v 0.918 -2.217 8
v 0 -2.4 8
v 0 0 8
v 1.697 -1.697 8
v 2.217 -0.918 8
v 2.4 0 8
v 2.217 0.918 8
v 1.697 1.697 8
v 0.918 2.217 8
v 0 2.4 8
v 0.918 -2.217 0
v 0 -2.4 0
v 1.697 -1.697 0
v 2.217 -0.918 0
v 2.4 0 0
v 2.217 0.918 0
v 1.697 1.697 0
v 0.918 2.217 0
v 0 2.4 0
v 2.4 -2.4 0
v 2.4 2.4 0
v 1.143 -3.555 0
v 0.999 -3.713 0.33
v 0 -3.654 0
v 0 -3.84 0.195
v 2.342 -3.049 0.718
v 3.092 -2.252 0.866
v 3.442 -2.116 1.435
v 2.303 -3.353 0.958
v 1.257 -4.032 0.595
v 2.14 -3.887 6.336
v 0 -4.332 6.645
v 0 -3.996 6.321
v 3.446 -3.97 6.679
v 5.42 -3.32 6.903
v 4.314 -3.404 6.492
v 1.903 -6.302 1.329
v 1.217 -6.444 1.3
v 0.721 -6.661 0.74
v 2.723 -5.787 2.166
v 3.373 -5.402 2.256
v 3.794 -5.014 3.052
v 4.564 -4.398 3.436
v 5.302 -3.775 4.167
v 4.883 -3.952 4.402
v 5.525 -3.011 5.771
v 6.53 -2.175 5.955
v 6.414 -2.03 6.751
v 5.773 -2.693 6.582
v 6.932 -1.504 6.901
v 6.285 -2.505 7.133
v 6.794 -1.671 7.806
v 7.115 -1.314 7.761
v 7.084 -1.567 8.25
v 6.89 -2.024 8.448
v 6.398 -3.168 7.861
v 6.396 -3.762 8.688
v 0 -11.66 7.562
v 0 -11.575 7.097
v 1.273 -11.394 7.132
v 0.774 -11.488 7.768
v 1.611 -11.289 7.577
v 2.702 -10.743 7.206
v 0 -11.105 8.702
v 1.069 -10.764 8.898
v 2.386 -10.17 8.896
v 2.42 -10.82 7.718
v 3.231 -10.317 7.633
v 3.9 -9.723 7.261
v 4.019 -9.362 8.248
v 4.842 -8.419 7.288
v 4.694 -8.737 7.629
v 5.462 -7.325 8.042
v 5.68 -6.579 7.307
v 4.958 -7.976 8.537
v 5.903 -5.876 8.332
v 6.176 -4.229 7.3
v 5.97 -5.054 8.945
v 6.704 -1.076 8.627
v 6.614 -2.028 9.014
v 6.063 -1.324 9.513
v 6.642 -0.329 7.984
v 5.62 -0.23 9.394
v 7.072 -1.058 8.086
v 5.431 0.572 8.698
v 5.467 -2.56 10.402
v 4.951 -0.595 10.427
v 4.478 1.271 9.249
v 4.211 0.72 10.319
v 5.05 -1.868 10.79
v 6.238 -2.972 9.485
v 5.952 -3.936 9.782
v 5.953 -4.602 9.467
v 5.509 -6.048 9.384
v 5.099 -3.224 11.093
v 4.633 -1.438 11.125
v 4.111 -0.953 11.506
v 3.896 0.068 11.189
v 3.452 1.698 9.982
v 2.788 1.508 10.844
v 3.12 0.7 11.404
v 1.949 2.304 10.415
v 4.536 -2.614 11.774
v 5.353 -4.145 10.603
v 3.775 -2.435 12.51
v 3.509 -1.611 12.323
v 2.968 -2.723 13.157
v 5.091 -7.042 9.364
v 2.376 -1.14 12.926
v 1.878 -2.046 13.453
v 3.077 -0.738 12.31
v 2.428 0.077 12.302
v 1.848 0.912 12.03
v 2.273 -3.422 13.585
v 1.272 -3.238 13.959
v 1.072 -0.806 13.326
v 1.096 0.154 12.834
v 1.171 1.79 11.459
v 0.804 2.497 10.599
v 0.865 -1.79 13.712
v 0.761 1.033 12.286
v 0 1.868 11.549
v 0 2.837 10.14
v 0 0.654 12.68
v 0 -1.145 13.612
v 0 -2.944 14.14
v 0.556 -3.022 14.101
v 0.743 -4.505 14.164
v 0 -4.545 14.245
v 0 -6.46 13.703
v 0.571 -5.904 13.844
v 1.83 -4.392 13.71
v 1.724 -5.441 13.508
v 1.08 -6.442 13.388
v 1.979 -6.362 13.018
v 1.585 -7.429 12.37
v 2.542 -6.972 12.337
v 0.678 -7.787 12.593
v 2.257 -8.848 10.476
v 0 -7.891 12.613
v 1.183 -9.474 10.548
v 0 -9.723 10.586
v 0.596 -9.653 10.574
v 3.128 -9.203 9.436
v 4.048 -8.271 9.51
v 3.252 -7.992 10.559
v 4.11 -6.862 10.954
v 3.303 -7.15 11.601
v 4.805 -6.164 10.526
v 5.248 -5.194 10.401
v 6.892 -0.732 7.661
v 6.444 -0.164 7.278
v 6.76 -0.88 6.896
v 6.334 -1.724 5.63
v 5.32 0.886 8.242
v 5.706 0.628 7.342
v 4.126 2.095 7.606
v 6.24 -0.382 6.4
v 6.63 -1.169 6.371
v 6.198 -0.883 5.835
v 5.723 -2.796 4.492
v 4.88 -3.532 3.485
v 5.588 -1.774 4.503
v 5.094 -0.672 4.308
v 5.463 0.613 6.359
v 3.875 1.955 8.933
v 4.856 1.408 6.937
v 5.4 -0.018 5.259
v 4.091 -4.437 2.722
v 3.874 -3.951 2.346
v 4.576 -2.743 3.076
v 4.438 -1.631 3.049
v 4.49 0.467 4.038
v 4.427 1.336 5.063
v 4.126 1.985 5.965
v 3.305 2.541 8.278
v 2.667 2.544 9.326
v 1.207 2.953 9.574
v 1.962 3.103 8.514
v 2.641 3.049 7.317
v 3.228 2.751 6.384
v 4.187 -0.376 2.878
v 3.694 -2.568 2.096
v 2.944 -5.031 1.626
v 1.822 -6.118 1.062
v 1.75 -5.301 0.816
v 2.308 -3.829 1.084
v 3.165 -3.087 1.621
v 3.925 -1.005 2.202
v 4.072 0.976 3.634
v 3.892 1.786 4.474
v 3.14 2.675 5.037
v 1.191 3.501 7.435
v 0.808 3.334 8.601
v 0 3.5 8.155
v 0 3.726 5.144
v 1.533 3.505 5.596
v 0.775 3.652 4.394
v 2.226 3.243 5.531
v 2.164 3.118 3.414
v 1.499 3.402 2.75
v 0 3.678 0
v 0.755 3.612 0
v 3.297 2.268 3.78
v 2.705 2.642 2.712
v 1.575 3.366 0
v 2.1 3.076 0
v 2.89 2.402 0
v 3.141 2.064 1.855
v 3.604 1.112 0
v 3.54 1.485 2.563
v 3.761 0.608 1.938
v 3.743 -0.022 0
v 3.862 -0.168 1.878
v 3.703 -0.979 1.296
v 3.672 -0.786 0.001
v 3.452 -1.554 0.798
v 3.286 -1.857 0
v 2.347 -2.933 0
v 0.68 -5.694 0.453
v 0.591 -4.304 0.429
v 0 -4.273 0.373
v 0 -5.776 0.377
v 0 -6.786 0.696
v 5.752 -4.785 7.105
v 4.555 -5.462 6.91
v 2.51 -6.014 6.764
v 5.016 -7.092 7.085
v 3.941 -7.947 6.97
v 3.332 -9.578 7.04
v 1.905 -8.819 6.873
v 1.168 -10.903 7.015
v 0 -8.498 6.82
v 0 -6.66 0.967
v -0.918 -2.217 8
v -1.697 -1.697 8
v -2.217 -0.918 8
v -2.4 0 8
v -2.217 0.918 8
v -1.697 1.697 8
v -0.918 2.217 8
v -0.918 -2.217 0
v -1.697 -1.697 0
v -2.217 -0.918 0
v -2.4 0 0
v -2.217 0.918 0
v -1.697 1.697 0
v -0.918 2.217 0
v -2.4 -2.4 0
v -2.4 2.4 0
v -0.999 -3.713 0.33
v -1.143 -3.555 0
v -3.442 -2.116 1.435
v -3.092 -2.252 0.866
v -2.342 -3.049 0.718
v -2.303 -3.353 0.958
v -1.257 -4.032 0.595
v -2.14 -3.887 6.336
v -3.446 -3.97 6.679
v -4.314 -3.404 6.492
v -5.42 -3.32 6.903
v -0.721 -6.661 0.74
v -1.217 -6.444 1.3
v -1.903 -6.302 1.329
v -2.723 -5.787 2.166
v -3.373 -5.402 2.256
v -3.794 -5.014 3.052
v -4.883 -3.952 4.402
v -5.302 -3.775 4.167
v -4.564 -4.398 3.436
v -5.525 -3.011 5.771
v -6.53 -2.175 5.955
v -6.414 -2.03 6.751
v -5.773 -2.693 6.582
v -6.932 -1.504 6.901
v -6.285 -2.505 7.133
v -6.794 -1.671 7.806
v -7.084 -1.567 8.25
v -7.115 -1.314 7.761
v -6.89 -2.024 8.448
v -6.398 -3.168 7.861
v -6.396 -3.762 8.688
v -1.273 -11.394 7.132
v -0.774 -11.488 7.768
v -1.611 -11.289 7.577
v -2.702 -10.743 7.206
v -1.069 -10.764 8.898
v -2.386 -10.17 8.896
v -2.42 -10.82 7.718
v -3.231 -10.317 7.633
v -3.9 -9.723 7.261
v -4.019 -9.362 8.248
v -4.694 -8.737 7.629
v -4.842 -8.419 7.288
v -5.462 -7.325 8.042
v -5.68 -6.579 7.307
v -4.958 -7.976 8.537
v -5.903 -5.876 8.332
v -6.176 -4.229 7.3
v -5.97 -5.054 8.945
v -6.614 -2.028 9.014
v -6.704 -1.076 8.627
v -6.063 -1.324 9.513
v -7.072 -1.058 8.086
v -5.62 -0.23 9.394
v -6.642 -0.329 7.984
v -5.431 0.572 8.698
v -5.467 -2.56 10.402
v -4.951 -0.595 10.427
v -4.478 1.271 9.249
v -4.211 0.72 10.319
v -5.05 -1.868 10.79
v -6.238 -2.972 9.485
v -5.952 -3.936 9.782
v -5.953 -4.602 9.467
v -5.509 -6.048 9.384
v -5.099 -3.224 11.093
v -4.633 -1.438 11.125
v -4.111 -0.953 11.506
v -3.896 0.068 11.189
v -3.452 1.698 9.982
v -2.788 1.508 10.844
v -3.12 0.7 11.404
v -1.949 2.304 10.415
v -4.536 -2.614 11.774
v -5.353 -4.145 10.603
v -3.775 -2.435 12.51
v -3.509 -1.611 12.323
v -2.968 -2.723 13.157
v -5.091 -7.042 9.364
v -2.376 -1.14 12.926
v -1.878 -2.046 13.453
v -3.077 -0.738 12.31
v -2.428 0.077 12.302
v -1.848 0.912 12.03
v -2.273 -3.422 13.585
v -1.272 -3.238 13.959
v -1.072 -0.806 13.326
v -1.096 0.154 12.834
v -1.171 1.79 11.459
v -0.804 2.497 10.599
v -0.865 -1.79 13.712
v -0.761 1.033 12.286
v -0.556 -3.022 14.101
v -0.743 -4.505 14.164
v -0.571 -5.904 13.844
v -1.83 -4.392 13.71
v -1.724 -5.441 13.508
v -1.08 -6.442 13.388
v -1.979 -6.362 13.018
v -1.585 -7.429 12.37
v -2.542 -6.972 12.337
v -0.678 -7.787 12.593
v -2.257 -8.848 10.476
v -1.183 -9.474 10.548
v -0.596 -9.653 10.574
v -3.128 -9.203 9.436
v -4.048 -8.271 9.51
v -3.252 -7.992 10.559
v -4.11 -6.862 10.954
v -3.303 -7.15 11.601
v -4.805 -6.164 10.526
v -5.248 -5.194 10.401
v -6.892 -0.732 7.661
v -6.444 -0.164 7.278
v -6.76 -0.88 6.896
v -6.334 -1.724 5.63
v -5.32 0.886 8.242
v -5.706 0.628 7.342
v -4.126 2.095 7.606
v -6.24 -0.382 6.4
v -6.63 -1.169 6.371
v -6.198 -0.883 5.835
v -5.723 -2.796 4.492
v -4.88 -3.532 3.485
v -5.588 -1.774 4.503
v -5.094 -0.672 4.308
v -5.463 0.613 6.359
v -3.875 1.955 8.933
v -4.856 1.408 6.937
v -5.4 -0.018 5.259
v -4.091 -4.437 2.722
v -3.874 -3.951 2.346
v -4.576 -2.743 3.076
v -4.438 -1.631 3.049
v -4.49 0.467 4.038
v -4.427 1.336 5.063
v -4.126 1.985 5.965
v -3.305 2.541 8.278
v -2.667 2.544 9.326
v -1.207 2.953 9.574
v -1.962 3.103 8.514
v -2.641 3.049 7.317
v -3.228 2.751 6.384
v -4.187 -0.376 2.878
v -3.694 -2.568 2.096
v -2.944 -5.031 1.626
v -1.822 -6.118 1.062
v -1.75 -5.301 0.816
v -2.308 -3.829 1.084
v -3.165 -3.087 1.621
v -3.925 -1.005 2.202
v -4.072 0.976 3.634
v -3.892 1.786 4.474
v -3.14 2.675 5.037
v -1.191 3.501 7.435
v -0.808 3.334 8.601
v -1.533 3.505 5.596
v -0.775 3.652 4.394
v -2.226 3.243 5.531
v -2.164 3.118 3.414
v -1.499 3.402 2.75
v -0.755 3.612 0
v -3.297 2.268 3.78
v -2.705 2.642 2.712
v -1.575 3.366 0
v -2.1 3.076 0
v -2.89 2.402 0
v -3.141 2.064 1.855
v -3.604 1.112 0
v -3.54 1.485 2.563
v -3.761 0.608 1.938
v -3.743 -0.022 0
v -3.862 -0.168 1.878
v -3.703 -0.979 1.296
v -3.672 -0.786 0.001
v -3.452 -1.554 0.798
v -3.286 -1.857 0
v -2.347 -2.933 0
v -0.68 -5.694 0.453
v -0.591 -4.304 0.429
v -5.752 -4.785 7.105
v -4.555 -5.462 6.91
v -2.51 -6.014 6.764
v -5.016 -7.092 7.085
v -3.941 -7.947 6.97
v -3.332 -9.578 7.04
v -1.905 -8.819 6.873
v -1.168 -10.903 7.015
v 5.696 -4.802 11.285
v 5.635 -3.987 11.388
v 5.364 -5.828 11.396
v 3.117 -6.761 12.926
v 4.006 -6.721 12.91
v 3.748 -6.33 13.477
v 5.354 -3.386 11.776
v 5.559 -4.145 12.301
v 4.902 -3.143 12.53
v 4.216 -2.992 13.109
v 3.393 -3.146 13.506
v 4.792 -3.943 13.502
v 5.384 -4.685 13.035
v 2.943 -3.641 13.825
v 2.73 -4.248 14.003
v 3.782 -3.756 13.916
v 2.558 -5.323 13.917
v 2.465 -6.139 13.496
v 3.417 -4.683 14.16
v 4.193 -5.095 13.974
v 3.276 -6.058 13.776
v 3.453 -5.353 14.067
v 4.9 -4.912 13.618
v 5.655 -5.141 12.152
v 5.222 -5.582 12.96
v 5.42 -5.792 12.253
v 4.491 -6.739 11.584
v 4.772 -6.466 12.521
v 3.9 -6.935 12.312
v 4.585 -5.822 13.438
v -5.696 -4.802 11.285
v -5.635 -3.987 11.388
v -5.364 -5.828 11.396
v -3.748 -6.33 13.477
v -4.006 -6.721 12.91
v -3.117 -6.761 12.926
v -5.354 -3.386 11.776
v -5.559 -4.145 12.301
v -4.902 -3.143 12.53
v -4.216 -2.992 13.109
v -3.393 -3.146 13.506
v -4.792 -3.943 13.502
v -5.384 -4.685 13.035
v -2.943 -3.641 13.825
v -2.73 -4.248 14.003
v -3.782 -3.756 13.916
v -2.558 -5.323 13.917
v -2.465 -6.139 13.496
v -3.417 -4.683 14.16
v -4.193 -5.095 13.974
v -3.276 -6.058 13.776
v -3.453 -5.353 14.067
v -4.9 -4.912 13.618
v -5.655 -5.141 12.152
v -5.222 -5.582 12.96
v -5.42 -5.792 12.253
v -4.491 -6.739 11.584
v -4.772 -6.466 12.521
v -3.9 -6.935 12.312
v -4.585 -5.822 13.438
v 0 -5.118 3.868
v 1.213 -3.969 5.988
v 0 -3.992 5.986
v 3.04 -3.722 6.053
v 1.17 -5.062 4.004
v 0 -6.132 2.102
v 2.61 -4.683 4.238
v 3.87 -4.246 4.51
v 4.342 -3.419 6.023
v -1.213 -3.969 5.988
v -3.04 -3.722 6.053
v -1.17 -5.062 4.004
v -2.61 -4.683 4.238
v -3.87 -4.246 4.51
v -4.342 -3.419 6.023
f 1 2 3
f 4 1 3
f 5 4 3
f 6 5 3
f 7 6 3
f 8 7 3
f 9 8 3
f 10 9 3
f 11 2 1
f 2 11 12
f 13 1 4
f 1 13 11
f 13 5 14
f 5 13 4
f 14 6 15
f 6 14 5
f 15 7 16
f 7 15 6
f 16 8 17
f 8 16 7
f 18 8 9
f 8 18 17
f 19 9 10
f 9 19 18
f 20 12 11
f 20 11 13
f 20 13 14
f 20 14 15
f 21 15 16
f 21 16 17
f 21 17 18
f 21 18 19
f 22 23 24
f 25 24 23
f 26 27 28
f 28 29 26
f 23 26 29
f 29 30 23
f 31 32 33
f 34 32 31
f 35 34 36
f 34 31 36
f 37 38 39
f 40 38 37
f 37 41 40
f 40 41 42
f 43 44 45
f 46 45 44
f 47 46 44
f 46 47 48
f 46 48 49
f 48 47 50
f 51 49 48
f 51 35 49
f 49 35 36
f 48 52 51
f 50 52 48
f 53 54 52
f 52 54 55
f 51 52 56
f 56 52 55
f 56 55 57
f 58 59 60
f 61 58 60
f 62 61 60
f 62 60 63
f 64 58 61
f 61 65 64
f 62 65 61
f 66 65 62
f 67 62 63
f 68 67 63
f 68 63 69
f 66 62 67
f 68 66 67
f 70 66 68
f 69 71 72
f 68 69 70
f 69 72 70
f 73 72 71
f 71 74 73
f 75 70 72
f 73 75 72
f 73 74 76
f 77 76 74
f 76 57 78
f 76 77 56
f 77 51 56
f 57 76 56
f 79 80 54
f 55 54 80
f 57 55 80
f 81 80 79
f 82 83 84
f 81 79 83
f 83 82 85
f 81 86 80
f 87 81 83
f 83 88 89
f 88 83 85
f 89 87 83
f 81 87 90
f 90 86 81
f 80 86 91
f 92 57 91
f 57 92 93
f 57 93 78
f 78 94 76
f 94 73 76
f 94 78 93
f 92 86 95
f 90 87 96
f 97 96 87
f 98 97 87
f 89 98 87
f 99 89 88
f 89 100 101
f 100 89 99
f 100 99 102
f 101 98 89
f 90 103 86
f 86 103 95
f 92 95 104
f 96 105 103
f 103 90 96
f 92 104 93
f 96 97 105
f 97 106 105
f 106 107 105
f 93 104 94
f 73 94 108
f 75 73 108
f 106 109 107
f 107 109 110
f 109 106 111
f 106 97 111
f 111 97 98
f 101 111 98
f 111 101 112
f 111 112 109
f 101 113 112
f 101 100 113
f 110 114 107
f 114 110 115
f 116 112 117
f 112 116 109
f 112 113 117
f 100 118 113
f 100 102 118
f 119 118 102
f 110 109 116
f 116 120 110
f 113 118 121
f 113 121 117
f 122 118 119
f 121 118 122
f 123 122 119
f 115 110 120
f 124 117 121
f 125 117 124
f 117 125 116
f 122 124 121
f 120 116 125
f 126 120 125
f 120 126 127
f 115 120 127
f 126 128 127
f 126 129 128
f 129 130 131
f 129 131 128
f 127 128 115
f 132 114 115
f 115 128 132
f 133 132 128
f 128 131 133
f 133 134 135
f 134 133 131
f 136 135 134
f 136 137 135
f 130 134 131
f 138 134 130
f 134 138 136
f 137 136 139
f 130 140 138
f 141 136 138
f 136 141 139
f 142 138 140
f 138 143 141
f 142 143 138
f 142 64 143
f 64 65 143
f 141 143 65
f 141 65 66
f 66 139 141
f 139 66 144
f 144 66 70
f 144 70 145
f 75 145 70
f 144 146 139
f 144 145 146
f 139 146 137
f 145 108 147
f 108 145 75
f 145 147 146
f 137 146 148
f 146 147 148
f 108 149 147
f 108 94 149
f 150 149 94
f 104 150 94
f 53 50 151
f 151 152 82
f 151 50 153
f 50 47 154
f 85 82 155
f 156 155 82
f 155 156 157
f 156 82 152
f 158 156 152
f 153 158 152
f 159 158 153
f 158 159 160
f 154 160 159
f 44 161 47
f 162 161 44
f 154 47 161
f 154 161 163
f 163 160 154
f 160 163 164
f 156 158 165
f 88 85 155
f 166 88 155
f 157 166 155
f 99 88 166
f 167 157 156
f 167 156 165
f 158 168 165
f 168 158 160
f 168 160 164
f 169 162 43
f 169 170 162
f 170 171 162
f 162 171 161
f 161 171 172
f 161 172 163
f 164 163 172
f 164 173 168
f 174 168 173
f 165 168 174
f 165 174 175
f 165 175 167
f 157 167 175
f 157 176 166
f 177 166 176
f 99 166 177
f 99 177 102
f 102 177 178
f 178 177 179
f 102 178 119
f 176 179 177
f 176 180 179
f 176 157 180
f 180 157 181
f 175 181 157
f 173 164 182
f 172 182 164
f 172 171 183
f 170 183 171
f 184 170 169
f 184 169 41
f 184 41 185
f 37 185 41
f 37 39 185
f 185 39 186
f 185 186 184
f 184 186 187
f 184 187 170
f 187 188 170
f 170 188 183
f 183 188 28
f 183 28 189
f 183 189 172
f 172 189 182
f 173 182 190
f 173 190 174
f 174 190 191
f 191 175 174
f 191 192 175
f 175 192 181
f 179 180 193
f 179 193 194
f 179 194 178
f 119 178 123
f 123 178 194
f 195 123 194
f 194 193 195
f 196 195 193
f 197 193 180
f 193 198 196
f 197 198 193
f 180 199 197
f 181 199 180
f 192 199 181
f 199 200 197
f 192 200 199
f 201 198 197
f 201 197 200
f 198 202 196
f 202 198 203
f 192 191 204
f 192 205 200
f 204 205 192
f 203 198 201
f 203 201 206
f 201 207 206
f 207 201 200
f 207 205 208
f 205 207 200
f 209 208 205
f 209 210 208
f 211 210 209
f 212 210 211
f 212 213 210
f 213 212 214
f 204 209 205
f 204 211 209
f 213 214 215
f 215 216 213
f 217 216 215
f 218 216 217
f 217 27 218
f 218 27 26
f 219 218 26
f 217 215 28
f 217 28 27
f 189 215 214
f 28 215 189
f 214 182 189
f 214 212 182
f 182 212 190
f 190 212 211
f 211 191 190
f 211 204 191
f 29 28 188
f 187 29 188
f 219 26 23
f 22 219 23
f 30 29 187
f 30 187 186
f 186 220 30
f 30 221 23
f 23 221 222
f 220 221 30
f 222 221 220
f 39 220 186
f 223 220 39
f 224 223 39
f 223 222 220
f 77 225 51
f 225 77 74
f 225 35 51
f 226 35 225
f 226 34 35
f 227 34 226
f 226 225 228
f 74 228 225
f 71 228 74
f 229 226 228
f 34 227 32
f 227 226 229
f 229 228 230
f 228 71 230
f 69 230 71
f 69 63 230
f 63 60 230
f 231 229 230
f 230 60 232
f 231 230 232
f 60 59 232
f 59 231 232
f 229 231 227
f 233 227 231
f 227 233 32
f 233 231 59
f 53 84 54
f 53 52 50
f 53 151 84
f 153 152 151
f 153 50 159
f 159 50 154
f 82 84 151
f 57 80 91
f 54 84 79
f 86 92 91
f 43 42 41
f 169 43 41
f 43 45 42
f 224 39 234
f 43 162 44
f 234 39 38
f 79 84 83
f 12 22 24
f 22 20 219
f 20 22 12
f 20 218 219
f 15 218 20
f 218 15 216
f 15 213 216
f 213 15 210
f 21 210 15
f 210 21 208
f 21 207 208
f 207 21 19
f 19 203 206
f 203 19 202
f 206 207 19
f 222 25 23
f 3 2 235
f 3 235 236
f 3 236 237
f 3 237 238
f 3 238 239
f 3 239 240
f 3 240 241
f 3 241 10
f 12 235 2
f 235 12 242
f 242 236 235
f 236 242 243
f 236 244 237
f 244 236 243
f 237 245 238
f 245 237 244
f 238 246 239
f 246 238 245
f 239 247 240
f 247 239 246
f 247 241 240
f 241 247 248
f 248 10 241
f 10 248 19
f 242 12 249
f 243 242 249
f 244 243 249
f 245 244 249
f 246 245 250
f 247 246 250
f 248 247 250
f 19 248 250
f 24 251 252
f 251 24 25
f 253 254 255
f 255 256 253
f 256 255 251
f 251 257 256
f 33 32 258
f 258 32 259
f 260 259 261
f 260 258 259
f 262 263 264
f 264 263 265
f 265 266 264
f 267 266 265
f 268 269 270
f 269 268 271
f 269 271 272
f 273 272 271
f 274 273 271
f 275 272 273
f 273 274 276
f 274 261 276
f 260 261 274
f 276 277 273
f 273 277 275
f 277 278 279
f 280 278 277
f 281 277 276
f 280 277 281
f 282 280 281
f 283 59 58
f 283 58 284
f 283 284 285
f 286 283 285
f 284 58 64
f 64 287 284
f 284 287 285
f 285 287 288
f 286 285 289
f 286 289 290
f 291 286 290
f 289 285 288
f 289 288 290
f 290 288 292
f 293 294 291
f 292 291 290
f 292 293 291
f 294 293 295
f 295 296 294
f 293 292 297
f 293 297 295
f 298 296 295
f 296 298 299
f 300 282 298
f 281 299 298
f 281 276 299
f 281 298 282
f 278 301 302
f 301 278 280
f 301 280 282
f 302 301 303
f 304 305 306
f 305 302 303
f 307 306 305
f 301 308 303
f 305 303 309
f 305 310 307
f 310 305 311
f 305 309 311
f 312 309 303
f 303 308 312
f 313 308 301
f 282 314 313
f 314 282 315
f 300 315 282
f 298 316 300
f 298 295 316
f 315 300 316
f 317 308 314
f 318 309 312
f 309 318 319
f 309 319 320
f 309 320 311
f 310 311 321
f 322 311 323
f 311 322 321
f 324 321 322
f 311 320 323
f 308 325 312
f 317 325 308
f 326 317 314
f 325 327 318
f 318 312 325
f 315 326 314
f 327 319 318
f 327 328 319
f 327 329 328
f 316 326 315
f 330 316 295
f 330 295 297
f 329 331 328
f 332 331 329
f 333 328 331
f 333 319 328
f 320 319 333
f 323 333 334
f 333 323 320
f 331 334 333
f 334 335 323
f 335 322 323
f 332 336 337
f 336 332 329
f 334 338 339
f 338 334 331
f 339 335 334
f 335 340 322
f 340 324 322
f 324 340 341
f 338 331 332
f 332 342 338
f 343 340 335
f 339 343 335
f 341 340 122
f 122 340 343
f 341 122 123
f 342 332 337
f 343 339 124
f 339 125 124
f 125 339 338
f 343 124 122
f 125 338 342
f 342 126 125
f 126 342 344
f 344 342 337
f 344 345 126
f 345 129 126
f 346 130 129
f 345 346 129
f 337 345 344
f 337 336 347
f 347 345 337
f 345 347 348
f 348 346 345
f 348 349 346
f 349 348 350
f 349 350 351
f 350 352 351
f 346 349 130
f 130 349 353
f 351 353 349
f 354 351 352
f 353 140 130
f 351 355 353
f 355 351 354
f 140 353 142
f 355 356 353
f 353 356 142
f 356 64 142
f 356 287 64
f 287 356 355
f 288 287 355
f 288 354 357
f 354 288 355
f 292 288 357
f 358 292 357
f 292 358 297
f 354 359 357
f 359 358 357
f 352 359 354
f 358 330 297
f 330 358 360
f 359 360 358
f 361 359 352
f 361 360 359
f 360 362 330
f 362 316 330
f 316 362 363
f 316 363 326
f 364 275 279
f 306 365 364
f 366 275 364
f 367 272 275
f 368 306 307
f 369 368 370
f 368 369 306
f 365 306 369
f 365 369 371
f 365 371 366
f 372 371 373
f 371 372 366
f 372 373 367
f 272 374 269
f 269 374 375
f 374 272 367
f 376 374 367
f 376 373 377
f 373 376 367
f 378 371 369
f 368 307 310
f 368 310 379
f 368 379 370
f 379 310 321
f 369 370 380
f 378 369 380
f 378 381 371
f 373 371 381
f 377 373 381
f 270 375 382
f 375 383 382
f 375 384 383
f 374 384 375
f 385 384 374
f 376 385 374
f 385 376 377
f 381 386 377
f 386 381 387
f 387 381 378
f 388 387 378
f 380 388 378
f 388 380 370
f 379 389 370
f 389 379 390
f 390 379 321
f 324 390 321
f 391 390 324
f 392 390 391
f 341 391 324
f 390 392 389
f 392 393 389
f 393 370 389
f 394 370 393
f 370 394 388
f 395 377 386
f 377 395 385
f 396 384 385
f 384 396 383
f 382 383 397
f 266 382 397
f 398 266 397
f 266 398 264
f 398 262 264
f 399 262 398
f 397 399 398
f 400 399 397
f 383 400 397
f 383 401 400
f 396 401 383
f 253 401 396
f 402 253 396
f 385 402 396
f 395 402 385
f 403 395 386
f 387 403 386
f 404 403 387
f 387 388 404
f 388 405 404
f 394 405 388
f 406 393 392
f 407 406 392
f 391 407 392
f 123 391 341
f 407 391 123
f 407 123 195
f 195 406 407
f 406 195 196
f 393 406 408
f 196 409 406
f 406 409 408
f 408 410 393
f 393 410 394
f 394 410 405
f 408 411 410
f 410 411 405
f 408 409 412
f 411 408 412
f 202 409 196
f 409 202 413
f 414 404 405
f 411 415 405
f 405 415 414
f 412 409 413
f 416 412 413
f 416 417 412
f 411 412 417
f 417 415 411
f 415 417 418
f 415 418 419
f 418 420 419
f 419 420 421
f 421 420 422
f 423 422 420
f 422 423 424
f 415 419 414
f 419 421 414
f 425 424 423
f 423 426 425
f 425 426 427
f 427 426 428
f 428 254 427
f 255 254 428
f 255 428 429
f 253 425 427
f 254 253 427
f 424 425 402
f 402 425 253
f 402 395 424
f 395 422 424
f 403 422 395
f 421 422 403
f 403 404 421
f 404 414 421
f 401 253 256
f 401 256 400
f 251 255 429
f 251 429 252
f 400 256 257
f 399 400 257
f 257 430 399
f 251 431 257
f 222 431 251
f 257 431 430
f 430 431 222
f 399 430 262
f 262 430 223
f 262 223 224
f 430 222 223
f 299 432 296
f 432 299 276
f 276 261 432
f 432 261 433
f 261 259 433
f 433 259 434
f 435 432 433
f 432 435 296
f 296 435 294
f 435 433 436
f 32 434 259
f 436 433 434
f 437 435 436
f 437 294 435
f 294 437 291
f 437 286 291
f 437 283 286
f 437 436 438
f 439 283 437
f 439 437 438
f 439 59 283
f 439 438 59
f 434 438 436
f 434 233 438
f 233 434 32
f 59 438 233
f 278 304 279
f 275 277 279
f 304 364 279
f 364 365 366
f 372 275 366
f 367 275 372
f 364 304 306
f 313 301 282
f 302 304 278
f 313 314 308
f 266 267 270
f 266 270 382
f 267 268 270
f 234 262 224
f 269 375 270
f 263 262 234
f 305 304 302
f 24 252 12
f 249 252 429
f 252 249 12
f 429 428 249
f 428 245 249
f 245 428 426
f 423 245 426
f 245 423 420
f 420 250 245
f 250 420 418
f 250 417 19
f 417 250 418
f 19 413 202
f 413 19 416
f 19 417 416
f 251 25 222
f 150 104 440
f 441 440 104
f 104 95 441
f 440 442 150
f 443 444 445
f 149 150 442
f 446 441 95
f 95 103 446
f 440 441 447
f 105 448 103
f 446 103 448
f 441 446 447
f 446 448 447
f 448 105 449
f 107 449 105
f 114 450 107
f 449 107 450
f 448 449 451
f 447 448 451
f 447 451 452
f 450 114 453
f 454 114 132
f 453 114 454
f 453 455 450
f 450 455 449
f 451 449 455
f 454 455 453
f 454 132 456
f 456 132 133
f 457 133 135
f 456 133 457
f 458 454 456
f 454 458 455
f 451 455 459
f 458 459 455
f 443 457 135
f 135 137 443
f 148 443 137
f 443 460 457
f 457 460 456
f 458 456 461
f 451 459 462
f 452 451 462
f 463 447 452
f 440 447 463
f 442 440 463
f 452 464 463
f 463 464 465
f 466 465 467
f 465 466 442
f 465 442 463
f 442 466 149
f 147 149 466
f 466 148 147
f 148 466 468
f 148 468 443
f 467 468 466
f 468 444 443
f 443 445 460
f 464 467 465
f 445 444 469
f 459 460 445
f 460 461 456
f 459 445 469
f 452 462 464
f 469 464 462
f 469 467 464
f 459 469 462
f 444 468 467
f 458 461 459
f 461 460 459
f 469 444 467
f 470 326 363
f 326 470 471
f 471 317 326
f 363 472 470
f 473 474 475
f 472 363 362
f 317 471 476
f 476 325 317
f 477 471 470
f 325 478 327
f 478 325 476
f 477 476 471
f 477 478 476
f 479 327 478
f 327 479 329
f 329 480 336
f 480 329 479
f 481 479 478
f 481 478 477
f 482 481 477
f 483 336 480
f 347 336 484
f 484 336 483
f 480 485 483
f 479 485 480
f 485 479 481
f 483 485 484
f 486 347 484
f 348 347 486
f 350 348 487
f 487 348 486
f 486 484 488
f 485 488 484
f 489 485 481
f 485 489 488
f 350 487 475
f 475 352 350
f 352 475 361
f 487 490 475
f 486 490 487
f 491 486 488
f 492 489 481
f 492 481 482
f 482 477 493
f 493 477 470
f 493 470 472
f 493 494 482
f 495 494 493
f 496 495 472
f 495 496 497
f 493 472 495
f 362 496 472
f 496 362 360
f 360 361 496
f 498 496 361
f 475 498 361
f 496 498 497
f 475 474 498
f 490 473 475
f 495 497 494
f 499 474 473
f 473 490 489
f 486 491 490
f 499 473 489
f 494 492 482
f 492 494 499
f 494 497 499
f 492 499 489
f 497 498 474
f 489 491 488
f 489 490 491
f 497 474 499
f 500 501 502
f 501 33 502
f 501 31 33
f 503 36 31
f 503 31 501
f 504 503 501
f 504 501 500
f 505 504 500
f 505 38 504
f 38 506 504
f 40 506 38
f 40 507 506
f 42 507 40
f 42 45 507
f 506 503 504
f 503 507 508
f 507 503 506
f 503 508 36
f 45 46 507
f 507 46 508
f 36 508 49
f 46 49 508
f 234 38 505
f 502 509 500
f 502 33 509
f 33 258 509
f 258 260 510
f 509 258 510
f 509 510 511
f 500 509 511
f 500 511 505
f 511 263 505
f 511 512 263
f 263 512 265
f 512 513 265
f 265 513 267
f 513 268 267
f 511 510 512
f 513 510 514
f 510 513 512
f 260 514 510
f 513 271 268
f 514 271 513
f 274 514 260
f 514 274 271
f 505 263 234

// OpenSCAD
use <../lib.scad>
use <s/89515s01.scad>
use <s/89515s02.scad>
use <s/89515s03.scad>
function ldraw_lib__89515() = [
// 0 Minifig Head Muppet Frog
// 0 Name: 89515.dat
// 0 Author: Fredrik Hareide [fhareide]
// 0 !LDRAW_ORG Part UPDATE 2025-08
// 0 !LICENSE Licensed under CC BY 4.0 : see CAreadme.txt
// 
// 0 BFC CERTIFY CCW
  [0,"BFC","CERTIFY"],
  [0,"BFC","CCW"],
// 
// 0 !HISTORY 2024-01-08 {LEGO Instructions App} Original part shape
// 0 !HISTORY 2024-01-08 [fhareide] File preparation for LDraw Parts Tracker
// 0 !HISTORY 2025-08-31 [OrionP] Official Update 2025-08
// 
// 1 16 0 0 0 1 0 0 0 1 0 0 0 1 s\89515s01.dat
  [1,16,0,0,0,1,0,0,0,1,0,0,0,1, ldraw_lib__s__89515s01()],
// 1 16 0 0 0 -1 0 0 0 1 0 0 0 1 s\89515s01.dat
  [1,16,0,0,0,-1,0,0,0,1,0,0,0,1, ldraw_lib__s__89515s01()],
// 
// 1 16 0 0 0 1 0 0 0 1 0 0 0 1 s\89515s02.dat
  [1,16,0,0,0,1,0,0,0,1,0,0,0,1, ldraw_lib__s__89515s02()],
// 1 16 0 0 0 -1 0 0 0 1 0 0 0 1 s\89515s02.dat
  [1,16,0,0,0,-1,0,0,0,1,0,0,0,1, ldraw_lib__s__89515s02()],
// 
// 1 16 0 0 0 1 0 0 0 1 0 0 0 1 s\89515s03.dat
  [1,16,0,0,0,1,0,0,0,1,0,0,0,1, ldraw_lib__s__89515s03()],
// 1 16 0 0 0 -1 0 0 0 1 0 0 0 1 s\89515s03.dat
  [1,16,0,0,0,-1,0,0,0,1,0,0,0,1, ldraw_lib__s__89515s03()],
];
module ldraw_lib__89515(step=0, col=false, unit=2/5, alt=false, line=0.2, solid=!$preview)
    makepoly(ldraw_lib__89515(), step=step, col=col, unit=unit, alt=alt, line=line, solid=solid);
ldraw_lib__89515(line=0.2);
